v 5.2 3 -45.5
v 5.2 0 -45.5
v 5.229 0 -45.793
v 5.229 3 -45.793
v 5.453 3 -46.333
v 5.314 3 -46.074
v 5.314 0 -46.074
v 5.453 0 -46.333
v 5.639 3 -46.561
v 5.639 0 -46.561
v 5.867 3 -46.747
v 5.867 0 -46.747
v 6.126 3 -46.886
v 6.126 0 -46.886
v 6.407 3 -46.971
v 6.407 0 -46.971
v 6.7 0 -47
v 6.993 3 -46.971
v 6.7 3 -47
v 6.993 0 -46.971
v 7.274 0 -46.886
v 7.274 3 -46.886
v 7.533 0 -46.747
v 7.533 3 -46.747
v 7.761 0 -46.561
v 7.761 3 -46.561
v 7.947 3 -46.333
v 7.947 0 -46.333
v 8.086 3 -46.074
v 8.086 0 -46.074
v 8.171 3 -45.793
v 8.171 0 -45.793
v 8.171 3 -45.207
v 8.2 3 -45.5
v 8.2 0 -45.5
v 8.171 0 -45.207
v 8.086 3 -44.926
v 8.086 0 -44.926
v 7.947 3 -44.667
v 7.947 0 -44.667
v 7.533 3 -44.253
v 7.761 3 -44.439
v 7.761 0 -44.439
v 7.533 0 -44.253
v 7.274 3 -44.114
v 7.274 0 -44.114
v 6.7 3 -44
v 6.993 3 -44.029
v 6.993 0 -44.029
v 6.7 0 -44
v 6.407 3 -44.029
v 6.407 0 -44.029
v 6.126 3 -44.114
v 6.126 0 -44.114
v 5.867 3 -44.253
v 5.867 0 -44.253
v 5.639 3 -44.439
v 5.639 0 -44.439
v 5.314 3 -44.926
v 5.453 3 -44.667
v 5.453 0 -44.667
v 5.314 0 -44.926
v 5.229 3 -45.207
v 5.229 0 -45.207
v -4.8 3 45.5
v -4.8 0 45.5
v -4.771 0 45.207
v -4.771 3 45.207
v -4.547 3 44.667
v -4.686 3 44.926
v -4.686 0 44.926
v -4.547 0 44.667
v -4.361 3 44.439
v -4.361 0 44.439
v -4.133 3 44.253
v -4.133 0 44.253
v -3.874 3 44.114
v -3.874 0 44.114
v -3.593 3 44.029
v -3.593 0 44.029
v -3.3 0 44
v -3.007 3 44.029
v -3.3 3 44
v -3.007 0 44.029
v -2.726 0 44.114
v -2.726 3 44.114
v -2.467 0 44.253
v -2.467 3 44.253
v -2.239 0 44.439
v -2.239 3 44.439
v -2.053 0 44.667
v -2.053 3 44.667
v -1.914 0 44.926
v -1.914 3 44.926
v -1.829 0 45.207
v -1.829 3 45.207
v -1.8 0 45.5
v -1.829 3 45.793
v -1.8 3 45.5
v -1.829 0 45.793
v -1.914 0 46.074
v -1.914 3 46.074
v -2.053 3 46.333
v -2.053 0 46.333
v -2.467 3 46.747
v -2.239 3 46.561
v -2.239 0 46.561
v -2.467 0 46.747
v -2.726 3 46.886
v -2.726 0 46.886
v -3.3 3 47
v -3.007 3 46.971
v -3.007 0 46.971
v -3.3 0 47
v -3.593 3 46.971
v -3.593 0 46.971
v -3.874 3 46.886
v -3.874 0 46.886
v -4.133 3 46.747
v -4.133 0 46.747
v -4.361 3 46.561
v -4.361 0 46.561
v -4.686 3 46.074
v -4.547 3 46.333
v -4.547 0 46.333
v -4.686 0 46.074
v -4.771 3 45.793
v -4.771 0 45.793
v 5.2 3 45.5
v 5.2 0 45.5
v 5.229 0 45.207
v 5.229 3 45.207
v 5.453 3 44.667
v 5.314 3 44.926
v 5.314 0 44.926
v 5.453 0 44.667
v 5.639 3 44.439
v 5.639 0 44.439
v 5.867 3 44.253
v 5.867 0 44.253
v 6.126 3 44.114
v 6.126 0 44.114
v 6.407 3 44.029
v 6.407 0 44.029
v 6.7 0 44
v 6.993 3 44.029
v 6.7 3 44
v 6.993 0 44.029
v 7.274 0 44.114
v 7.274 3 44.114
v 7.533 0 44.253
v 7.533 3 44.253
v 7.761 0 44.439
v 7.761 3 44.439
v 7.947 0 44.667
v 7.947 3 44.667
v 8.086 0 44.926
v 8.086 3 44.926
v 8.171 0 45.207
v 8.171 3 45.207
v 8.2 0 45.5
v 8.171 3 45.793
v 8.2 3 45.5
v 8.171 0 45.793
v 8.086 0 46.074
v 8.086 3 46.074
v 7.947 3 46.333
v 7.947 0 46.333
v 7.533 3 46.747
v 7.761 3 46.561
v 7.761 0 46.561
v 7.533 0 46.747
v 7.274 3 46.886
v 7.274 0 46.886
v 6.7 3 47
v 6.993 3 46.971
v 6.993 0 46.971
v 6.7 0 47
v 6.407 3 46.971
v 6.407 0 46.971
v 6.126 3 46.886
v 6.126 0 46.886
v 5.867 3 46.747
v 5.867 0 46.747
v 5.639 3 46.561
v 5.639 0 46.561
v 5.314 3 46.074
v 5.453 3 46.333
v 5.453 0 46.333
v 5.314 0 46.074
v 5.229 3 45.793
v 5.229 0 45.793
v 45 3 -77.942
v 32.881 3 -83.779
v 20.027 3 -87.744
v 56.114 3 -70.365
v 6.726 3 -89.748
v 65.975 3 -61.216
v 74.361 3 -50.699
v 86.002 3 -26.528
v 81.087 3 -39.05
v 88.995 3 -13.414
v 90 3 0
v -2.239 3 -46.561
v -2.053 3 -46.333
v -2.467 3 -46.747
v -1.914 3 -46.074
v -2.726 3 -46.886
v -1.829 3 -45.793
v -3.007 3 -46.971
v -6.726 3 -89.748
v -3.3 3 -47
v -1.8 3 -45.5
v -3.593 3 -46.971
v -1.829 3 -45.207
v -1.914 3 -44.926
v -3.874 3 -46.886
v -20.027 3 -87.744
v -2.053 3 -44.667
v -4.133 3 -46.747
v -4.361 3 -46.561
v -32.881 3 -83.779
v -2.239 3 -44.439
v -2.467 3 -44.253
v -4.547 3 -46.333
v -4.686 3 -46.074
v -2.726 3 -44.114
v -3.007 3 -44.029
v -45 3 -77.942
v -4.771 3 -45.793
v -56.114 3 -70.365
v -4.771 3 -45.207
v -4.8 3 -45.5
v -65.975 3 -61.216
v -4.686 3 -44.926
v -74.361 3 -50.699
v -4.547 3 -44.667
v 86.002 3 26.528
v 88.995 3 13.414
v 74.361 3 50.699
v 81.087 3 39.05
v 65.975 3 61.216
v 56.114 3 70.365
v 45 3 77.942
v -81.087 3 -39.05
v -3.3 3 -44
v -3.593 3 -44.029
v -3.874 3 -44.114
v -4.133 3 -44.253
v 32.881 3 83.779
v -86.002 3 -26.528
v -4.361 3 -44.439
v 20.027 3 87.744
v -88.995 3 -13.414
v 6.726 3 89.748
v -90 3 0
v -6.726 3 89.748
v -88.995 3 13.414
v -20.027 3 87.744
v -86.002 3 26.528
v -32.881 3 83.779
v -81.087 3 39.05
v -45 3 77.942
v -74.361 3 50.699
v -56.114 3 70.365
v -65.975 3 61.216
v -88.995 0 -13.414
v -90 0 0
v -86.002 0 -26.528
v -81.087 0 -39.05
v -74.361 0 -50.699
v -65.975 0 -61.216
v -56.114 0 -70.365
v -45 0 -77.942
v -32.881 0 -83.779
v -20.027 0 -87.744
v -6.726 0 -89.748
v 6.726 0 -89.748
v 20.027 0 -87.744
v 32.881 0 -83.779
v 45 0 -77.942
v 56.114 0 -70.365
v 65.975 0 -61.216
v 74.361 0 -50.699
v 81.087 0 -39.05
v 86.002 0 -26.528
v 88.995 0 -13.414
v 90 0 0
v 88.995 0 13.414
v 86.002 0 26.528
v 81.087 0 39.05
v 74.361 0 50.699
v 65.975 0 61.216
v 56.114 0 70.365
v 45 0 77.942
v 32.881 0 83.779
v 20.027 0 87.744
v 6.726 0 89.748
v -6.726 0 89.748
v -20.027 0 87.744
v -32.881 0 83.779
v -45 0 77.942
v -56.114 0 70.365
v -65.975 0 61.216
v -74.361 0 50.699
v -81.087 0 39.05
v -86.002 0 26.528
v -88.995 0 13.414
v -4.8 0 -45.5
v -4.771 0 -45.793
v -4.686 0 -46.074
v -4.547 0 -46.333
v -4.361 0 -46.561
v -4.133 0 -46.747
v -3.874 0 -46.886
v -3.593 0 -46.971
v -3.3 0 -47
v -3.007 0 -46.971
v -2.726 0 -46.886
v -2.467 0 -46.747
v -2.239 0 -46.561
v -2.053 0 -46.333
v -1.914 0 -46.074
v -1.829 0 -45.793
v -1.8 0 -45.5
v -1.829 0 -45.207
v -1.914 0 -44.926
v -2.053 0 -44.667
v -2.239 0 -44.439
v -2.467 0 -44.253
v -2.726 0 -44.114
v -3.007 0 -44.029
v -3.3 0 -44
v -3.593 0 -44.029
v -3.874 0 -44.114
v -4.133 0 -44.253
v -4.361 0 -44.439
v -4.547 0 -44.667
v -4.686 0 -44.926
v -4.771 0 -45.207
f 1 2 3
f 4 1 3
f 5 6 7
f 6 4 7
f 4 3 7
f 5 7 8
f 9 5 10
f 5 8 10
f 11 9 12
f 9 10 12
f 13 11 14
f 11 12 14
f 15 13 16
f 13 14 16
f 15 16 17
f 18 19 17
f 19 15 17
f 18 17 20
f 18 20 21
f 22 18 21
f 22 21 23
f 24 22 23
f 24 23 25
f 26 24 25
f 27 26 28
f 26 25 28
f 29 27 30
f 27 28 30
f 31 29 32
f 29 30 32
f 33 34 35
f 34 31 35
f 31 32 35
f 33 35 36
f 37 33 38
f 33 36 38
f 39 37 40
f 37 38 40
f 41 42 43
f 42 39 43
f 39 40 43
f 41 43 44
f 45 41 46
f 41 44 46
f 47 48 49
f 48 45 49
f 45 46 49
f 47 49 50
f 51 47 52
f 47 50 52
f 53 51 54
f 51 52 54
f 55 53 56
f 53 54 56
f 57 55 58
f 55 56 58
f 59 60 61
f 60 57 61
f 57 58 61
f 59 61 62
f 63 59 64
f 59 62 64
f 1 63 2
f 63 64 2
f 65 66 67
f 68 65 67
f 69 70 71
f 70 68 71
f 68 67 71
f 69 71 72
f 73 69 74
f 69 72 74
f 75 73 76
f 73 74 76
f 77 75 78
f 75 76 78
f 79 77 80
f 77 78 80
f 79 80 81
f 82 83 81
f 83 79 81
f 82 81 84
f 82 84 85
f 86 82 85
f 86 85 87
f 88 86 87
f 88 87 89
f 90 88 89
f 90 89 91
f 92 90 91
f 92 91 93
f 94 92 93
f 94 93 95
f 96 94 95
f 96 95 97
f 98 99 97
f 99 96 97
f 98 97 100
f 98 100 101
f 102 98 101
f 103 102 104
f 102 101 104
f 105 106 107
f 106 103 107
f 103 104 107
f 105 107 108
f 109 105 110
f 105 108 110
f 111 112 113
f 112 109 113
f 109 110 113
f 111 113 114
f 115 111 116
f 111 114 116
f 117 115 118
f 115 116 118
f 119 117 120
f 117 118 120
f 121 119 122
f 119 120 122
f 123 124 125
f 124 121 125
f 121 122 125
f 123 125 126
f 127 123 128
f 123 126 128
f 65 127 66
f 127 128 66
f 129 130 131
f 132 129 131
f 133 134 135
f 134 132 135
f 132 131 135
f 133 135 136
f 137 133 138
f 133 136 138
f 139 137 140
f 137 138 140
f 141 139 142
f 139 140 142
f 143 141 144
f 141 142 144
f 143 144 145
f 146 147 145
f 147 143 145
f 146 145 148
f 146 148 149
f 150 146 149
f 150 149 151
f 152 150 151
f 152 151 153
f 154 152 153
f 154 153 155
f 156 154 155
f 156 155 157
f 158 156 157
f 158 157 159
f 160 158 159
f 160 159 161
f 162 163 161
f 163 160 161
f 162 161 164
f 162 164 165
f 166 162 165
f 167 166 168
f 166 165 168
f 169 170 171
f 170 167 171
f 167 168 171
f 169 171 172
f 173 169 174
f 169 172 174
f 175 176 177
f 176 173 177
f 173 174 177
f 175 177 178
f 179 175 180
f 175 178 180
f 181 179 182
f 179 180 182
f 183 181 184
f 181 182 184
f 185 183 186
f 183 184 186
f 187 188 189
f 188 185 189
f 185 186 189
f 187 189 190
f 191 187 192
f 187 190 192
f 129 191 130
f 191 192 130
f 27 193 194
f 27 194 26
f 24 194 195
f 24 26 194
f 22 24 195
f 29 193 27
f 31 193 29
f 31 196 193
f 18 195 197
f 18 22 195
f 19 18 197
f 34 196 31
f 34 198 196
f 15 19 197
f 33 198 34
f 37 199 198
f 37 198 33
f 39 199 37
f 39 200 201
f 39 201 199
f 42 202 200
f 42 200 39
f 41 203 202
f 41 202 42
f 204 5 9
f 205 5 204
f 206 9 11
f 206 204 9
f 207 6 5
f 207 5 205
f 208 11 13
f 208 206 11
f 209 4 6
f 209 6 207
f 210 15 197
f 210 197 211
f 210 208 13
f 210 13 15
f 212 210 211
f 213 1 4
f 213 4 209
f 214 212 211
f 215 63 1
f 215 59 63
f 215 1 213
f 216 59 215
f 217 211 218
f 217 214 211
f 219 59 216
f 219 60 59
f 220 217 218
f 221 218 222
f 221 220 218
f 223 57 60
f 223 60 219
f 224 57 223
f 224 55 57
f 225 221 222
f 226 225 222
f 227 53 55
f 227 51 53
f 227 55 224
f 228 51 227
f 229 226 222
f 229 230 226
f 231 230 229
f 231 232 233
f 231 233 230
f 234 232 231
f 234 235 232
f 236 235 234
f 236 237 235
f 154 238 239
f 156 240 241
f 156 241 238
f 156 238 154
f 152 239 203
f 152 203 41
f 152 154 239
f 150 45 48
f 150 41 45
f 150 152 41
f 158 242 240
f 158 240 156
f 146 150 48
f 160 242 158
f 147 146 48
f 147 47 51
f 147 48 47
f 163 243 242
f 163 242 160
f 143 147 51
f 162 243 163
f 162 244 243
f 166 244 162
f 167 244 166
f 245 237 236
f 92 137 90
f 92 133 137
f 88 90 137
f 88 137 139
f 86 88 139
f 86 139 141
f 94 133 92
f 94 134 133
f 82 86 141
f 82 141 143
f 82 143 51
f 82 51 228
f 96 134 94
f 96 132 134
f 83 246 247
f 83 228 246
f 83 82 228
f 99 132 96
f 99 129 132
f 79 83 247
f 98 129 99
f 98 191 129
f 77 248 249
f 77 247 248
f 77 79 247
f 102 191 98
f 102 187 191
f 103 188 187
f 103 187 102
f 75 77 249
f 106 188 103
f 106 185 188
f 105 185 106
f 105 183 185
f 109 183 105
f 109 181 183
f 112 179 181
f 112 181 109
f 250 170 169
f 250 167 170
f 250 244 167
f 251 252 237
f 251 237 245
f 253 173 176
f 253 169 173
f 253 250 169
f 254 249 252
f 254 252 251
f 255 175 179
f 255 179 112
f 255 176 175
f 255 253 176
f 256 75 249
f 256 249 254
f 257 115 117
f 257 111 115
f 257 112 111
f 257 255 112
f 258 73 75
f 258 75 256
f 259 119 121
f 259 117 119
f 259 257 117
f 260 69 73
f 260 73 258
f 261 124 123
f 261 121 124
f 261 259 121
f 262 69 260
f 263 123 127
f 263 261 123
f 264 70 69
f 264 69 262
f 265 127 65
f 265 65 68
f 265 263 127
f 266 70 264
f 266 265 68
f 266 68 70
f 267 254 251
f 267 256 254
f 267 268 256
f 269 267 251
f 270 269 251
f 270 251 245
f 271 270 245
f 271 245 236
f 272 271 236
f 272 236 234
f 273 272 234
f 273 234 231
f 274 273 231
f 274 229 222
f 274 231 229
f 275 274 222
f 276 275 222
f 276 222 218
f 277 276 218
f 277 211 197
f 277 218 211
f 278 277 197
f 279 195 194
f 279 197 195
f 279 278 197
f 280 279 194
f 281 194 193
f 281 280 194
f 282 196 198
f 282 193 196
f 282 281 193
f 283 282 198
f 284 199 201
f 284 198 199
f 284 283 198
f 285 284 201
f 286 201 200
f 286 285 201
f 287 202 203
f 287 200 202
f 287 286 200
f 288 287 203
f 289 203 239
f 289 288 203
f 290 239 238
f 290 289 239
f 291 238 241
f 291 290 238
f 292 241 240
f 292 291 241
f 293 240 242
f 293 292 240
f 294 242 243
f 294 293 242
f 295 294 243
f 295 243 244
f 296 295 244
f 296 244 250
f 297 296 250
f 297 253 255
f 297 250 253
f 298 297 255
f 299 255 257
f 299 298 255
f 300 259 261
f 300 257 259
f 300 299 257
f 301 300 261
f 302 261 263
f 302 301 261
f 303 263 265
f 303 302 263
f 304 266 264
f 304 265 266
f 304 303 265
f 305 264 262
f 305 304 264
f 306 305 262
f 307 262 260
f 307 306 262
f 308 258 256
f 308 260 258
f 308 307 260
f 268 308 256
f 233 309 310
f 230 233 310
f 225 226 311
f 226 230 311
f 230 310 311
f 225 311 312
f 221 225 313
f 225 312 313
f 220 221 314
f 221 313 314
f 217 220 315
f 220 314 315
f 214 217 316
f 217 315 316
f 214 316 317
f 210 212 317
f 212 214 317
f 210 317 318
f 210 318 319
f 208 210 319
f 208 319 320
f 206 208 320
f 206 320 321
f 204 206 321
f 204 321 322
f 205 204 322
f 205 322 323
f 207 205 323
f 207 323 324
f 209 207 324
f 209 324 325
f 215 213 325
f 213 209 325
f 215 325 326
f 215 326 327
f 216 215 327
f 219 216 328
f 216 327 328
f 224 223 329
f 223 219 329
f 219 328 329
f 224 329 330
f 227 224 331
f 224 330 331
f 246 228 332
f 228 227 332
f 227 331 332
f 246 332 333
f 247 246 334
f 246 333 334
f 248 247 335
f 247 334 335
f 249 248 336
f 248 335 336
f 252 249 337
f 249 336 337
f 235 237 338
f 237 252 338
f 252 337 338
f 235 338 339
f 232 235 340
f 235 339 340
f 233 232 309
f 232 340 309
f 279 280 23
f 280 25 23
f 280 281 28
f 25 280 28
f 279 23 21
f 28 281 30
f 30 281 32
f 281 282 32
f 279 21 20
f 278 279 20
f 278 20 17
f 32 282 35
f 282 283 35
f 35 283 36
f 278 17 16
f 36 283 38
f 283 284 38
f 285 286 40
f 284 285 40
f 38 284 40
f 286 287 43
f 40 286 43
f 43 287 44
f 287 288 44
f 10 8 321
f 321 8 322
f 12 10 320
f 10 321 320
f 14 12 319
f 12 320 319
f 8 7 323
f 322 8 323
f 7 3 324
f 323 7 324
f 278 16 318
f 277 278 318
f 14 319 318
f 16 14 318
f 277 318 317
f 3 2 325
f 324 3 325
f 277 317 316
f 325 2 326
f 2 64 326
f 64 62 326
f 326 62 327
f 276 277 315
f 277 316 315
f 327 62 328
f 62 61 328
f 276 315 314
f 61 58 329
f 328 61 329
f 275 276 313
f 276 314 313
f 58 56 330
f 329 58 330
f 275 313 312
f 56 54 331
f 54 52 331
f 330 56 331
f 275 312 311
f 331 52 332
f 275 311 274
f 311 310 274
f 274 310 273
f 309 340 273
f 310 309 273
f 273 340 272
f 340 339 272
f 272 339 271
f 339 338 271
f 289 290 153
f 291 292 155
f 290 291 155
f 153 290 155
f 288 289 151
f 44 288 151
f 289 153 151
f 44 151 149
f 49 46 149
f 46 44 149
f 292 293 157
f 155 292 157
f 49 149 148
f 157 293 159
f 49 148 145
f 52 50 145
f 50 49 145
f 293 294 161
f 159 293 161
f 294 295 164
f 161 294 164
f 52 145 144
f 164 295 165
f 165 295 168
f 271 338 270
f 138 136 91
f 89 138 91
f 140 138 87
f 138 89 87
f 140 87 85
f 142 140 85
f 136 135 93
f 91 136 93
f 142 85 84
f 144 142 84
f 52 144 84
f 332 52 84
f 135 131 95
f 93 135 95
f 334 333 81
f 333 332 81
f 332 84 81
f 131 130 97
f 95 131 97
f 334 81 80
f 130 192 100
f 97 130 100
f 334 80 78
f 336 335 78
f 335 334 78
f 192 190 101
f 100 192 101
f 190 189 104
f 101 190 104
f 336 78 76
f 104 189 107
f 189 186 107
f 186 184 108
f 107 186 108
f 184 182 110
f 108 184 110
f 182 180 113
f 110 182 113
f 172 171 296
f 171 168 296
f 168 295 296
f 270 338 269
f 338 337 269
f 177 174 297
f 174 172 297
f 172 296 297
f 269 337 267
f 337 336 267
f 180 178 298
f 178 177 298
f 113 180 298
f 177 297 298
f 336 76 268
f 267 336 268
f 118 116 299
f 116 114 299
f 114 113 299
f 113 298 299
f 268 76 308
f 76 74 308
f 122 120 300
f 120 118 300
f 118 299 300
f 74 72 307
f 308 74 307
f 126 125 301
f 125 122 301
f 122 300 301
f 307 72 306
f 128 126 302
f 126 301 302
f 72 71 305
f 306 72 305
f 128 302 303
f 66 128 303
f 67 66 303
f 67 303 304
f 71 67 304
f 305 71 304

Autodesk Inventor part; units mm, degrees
ref_plane "YZ Plane" through (0, 0, 0) normal (1, 0, 0) x (0, 1, 0)
ref_plane "XZ Plane" through (0, 0, 0) normal (0, 1, 0) x (-1, 0, 0)
ref_plane "XY Plane" through (0, 0, 0) normal (0, 0, 1) x (1, 0, 0)
sketch "Sketch1" plane through (0, 0, 0) normal (0, 1, 0) x (-1, 0, 0)
  circle A0 centre (0, 0) radius 90
  line L0 (0, 0) -> (3.3, 0) construction
  line L1 (3.3, 0) -> (3.3, 45.5) construction
  circle A1 centre (3.3, 45.5) radius 1.5
  line L2 (3.3, 45.5) -> (-6.7, 45.5) construction
  circle A2 centre (-6.7, 45.5) radius 1.5
  line L3 (3.3, 0) -> (3.3, -45.5) construction
  circle A3 centre (3.3, -45.5) radius 1.5
  line L4 (3.3, -45.5) -> (-6.7, -45.5) construction
  circle A4 centre (-6.7, -45.5) radius 1.5
  dimension "d0" = 180
  dimension "d1" = 3.3
  dimension "d2" = 45.5
  dimension "d3" = 3
  dimension "d4" = 10
  dimension "d5" = 3
  dimension "d6" = 45.5
  dimension "d7" = 3
  dimension "d8" = 10
  dimension "d9" = 3
extrude "Extrusion1" add sketch "Sketch1" along normal blind 3
properties part number "hiago_tampassl2"
